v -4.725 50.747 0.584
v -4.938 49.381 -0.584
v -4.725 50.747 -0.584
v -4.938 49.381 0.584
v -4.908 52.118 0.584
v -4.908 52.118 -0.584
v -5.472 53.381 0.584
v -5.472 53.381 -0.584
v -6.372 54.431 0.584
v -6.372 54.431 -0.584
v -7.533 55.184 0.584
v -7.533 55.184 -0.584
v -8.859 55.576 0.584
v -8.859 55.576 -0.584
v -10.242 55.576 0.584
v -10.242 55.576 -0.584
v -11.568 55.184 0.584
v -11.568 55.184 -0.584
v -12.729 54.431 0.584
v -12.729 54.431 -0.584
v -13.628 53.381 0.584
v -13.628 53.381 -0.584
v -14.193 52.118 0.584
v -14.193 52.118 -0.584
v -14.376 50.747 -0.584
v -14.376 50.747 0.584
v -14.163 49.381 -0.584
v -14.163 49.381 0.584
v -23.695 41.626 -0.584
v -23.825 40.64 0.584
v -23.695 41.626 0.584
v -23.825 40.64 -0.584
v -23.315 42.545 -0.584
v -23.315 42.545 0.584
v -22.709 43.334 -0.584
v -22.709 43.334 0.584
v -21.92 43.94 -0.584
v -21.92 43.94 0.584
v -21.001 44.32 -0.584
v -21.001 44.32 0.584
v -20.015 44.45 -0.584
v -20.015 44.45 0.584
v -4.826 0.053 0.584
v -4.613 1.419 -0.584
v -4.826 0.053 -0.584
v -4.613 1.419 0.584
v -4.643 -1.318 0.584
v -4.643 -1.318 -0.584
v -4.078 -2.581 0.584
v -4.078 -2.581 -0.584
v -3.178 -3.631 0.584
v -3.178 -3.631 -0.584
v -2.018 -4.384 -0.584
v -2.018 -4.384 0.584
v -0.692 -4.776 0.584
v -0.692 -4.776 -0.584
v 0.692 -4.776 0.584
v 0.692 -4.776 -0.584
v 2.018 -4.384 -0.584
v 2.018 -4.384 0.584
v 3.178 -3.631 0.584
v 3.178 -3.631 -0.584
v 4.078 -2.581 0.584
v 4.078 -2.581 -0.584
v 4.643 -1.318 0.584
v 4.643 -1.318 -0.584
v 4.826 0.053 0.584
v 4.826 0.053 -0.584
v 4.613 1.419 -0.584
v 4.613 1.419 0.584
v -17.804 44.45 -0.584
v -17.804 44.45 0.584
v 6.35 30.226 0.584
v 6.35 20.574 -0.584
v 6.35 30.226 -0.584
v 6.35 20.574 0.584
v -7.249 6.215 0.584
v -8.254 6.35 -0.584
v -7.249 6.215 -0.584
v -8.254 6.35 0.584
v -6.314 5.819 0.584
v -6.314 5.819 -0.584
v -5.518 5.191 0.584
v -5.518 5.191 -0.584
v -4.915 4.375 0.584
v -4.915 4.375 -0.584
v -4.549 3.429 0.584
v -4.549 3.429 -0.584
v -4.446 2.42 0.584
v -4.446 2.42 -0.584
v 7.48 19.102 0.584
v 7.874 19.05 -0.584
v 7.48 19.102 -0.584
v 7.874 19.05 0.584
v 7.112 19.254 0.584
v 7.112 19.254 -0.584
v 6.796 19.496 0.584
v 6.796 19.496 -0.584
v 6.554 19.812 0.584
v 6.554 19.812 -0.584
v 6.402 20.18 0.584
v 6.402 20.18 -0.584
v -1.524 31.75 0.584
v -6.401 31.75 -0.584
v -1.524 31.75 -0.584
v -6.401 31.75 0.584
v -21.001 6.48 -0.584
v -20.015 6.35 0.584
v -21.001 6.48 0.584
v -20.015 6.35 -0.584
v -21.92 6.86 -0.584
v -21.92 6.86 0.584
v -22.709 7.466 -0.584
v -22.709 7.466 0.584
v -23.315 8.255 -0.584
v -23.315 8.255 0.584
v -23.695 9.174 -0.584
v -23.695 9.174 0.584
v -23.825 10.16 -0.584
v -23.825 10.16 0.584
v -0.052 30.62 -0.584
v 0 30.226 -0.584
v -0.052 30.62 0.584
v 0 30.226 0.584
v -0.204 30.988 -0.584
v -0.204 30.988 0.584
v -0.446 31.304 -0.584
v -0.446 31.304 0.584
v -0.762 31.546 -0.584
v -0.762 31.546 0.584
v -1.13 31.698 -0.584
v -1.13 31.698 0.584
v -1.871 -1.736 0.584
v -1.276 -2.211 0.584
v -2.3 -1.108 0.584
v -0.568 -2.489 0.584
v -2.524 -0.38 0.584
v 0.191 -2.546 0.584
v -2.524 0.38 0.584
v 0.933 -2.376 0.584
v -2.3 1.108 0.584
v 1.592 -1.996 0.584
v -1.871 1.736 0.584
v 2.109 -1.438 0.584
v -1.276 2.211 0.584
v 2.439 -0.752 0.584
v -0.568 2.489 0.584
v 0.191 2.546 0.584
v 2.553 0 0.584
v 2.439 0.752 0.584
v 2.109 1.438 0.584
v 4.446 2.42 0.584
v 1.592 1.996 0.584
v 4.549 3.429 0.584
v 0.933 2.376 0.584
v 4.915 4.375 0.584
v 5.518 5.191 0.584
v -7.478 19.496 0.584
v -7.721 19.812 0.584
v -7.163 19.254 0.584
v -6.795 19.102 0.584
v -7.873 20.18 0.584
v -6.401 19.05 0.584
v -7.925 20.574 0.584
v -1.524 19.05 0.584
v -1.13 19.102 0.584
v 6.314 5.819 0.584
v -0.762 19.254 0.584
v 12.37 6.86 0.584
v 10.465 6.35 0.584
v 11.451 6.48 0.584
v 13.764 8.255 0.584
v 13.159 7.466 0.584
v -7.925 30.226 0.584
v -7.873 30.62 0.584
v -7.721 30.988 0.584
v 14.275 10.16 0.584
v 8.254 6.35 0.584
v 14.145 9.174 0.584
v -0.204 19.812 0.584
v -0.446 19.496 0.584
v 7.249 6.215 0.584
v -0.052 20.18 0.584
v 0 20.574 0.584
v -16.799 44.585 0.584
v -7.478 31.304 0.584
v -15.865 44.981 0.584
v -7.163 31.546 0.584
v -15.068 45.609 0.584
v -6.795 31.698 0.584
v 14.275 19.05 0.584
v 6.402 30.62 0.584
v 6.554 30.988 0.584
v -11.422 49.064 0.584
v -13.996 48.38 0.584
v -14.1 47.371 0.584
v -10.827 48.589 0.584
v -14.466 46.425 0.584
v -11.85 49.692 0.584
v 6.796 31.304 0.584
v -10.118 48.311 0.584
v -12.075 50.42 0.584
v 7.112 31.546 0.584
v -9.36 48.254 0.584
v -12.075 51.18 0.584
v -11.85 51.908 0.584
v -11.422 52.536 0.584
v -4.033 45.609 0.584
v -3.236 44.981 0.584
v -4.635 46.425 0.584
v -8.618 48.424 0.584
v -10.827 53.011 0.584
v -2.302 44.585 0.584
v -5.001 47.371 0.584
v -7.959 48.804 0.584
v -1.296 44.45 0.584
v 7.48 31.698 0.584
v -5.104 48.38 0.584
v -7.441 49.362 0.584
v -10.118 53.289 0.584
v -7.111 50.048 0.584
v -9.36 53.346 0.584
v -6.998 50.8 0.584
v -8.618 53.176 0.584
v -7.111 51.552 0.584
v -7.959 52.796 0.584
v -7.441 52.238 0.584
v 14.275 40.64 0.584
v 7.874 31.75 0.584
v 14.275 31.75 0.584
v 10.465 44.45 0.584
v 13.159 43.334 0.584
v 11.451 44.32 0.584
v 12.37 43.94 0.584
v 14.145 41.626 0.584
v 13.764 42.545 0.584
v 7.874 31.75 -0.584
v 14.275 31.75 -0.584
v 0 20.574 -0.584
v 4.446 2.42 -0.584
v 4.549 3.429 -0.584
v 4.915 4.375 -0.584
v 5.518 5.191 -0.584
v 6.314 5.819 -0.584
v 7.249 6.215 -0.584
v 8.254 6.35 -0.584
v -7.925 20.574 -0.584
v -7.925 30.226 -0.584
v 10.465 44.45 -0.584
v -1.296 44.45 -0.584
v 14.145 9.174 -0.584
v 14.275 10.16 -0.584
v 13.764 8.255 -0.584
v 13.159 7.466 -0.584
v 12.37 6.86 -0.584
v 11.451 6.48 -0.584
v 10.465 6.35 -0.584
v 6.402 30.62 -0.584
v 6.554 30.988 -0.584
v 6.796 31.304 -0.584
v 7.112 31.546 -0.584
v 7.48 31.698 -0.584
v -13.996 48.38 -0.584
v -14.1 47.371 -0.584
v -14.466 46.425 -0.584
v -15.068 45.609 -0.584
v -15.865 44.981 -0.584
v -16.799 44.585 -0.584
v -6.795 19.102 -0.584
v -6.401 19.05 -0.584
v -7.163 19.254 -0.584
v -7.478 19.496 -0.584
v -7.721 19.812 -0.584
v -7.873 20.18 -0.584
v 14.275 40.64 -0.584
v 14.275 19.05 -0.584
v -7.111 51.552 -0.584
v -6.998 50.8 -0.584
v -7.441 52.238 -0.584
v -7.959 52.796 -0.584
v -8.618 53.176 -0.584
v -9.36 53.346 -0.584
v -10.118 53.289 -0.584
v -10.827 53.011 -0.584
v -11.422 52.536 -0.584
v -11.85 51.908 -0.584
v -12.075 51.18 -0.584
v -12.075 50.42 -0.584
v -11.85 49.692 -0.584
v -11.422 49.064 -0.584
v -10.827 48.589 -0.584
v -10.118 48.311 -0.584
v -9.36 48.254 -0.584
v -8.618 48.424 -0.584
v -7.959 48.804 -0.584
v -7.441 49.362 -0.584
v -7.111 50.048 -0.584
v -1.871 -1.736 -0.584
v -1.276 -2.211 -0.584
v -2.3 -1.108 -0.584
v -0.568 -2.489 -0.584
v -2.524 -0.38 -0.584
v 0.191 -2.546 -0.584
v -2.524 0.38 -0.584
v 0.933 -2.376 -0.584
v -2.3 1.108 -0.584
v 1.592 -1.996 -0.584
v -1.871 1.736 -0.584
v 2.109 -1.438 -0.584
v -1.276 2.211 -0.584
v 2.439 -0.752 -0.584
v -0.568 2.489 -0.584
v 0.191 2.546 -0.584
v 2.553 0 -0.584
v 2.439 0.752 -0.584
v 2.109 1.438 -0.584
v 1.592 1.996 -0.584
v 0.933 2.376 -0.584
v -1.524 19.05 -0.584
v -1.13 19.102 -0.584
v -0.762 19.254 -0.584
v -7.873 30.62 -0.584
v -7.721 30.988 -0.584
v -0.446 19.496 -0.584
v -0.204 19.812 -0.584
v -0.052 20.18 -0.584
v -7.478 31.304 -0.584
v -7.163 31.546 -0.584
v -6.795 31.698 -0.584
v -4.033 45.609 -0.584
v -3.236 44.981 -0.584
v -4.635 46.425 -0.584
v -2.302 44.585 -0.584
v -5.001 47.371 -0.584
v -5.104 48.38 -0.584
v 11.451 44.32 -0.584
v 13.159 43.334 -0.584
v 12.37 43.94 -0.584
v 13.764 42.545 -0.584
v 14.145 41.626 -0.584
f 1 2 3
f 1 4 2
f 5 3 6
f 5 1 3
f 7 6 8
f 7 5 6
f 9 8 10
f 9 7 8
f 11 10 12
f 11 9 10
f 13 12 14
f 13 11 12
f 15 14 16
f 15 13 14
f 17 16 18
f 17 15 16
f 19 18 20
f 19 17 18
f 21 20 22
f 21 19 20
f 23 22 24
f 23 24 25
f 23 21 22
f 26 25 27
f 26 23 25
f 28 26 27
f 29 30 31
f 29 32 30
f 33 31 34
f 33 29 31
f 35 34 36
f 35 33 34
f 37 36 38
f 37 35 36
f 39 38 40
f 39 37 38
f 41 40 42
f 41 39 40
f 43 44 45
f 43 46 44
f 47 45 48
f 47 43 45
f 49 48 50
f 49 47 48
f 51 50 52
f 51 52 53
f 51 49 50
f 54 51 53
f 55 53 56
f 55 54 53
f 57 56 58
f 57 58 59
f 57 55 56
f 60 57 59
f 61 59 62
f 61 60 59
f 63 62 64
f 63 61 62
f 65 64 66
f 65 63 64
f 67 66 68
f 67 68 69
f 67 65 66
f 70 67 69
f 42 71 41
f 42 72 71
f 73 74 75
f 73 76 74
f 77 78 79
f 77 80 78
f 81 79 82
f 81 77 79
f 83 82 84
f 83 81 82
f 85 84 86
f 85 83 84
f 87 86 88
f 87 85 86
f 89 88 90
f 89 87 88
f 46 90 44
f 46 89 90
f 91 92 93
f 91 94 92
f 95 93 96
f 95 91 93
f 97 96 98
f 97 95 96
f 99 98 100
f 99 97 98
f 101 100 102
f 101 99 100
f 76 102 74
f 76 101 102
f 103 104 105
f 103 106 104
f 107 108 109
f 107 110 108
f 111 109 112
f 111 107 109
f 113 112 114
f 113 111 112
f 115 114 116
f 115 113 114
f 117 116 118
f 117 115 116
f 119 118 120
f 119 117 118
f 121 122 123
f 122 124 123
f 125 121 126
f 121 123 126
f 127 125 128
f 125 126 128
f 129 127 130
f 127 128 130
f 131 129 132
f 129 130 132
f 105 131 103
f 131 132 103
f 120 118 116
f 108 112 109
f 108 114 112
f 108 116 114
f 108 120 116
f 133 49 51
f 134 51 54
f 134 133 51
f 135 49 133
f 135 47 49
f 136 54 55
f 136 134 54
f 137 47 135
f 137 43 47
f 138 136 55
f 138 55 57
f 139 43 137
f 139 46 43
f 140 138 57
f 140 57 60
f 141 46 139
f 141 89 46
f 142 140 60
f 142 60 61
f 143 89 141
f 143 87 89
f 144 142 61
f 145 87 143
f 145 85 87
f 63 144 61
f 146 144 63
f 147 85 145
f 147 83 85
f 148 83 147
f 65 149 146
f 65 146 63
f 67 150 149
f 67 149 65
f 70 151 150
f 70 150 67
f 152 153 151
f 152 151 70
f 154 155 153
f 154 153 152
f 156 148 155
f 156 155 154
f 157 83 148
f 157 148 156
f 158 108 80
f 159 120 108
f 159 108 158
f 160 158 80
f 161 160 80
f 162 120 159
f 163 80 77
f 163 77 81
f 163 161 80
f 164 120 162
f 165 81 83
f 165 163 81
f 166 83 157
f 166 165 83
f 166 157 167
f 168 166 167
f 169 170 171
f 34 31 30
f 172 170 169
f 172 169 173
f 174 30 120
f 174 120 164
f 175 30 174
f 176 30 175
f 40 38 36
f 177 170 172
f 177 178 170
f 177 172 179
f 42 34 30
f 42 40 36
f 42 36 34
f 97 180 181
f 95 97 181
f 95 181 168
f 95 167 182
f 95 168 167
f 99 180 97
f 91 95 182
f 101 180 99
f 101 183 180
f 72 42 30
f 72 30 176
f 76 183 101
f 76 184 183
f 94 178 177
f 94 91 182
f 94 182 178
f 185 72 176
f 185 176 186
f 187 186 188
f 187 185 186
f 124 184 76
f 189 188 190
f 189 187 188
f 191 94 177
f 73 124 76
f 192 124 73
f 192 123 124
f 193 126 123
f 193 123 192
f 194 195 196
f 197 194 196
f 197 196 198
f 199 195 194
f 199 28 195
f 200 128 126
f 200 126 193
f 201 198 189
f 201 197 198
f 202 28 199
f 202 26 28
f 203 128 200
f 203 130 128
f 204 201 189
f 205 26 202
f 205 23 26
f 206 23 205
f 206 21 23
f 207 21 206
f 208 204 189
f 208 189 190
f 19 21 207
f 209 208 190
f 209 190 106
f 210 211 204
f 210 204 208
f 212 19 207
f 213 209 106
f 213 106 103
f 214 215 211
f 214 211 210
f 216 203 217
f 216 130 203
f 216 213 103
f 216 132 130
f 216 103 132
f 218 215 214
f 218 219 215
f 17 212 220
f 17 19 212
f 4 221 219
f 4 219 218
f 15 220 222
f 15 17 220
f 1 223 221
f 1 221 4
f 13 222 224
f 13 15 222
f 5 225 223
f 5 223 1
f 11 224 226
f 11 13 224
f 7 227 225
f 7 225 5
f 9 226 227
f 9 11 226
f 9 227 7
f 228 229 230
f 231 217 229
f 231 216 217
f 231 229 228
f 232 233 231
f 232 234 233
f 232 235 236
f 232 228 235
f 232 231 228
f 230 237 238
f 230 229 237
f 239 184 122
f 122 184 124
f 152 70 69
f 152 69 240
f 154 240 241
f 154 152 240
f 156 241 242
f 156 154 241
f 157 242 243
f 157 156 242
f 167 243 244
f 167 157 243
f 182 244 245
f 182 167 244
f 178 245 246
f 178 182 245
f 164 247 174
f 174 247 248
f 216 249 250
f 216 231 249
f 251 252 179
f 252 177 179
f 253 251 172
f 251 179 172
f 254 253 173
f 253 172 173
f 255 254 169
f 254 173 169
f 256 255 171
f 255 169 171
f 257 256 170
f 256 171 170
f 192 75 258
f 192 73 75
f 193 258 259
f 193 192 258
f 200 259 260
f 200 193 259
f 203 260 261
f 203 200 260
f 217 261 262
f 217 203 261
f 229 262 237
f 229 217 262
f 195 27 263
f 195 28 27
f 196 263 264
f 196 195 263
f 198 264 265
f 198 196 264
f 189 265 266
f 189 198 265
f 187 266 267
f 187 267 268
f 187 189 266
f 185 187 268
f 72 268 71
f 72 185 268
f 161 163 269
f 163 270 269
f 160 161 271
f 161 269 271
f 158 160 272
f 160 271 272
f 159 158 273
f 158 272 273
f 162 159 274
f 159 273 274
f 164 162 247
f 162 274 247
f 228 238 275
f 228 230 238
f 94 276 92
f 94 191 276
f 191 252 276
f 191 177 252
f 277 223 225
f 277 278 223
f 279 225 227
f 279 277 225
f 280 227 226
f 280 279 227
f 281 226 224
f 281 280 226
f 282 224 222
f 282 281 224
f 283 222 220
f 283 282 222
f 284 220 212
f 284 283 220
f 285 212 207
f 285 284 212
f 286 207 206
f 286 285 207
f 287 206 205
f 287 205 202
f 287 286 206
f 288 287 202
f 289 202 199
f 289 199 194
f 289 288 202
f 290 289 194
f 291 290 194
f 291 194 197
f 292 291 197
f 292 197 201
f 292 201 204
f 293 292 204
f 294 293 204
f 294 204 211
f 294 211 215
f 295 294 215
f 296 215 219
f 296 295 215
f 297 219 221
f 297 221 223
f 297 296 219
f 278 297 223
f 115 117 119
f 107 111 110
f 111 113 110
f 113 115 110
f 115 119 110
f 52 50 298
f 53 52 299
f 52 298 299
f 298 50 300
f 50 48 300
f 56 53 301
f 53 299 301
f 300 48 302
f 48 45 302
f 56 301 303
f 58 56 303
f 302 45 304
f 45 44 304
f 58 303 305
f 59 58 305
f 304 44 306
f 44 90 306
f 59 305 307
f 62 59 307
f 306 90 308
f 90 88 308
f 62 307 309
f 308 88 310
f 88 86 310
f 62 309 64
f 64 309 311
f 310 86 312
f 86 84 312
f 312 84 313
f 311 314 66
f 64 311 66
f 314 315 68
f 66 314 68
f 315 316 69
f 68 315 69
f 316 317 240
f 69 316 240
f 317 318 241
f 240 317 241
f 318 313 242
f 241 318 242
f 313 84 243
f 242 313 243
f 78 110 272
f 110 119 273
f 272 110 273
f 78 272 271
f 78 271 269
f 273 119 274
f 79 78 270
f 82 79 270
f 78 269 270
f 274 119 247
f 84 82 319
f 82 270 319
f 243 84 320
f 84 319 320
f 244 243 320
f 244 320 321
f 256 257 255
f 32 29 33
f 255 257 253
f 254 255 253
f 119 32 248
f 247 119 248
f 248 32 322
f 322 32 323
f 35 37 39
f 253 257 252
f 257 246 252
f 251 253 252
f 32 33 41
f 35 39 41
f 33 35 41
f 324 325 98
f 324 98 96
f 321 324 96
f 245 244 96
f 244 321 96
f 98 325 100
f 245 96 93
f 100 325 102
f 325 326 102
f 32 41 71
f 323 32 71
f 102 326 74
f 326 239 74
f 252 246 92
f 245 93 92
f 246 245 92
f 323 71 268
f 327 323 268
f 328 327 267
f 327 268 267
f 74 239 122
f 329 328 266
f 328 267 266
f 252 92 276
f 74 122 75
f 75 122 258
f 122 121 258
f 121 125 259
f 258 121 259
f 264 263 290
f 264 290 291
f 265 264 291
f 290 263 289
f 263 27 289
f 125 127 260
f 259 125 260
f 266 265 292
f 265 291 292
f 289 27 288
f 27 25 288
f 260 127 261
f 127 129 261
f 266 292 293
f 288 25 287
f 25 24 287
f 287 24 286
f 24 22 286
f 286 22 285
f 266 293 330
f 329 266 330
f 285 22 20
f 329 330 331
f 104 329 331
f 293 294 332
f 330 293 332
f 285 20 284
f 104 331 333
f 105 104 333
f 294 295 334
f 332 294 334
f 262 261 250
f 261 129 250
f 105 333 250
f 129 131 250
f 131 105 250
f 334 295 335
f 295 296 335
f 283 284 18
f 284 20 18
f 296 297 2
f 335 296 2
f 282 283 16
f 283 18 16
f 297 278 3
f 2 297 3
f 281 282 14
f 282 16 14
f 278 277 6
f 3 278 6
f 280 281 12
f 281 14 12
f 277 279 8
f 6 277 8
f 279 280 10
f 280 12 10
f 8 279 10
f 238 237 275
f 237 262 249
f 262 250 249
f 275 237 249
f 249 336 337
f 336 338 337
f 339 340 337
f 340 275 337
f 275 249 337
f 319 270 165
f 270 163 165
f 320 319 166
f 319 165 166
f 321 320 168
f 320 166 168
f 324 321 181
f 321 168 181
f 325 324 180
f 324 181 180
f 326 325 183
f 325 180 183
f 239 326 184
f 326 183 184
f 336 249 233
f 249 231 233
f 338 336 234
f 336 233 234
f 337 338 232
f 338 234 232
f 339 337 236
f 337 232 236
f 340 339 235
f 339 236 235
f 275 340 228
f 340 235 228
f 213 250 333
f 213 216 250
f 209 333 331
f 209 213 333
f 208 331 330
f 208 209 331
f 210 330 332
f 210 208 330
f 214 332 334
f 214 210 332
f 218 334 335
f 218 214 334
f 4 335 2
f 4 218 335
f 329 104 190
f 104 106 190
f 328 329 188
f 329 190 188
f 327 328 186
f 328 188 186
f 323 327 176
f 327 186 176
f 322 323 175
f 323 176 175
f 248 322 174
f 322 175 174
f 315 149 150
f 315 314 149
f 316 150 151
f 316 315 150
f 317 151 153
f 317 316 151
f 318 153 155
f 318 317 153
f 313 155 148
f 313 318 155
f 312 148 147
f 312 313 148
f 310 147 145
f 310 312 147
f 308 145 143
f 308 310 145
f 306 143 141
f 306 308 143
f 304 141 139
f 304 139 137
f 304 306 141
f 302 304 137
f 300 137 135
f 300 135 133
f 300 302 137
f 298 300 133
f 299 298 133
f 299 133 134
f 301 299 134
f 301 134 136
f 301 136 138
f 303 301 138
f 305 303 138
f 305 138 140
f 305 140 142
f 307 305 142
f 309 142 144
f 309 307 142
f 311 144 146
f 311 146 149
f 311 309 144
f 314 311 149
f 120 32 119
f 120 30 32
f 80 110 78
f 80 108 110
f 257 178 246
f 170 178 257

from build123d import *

# Parameters (mm, degrees)
SKETCH1_R           = 2.5527
SKETCH1_W           = 7.9248
SKETCH1_H           = 12.7
BOSS_EXTRUDE1_DEPTH = 0.5842
FILLET1_R           = 3.81
FILLET2_R           = 1.524


with BuildPart() as part:
    # Sketch1 → Boss-Extrude1 (new body, symmetric)
    with BuildSketch(Plane.XY):
        with BuildLine():
            ThreePointArc((-4.612542275, 1.419411765), (0, -4.826), (4.612542275, 1.419411765))
            ThreePointArc((4.612542275, 1.419411765), (5.18926029, 4.803477283), (8.254023019, 6.35))
            Line((8.254023019, 6.35), (14.2748, 6.35))
            Line((14.2748, 6.35), (14.2748, 19.05))
            Line((14.2748, 19.05), (6.35, 19.05))
            Line((6.35, 19.05), (6.35, 31.75))
            Line((6.35, 31.75), (14.2748, 31.75))
            Line((14.2748, 31.75), (14.2748, 44.45))
            Line((14.2748, 44.45), (-1.296376981, 44.45))
            ThreePointArc((-1.296376981, 44.45), (-4.36113971, 45.996522717), (-4.937857725, 49.380588235))
            ThreePointArc((-4.937857725, 49.380588235), (-9.5504, 55.626), (-14.162942275, 49.380588235))
            ThreePointArc((-14.162942275, 49.380588235), (-14.73966029, 45.996522717), (-17.804423019, 44.45))
            Line((-17.804423019, 44.45), (-23.8252, 44.45))
            Line((-23.8252, 44.45), (-23.8252, 6.35))
            Line((-23.8252, 6.35), (-8.254023019, 6.35))
            ThreePointArc((-8.254023019, 6.35), (-5.18926029, 4.803477283), (-4.612542275, 1.419411765))
        make_face()
        Circle(SKETCH1_R, mode=Mode.SUBTRACT)
        with Locations((-9.5504, 50.8)):
            Circle(SKETCH1_R, mode=Mode.SUBTRACT)
        with Locations((-3.9624, 25.4)):
            Rectangle(SKETCH1_W, SKETCH1_H, mode=Mode.SUBTRACT)
    extrude(amount=BOSS_EXTRUDE1_DEPTH, both=True)

    # Fillet1
    fillet1_edges = [part.edges().sort_by_distance(p)[0] for p in [
        (-23.8252, 6.35, 0),
        (-23.8252, 44.45, 0),
        (14.2748, 44.45, 0),
        (14.2748, 6.35, 0),
    ]]
    fillet(fillet1_edges, radius=FILLET1_R)

    # Fillet2
    fillet2_edges = [part.edges().sort_by_distance(p)[0] for p in [
        (6.35, 31.75, 0),
        (6.35, 19.05, 0),
        (-7.9248, 19.05, 0),
        (0, 19.05, 0),
        (0, 31.75, 0),
        (-7.9248, 31.75, 0),
    ]]
    fillet(fillet2_edges, radius=FILLET2_R)


solid = part.part
